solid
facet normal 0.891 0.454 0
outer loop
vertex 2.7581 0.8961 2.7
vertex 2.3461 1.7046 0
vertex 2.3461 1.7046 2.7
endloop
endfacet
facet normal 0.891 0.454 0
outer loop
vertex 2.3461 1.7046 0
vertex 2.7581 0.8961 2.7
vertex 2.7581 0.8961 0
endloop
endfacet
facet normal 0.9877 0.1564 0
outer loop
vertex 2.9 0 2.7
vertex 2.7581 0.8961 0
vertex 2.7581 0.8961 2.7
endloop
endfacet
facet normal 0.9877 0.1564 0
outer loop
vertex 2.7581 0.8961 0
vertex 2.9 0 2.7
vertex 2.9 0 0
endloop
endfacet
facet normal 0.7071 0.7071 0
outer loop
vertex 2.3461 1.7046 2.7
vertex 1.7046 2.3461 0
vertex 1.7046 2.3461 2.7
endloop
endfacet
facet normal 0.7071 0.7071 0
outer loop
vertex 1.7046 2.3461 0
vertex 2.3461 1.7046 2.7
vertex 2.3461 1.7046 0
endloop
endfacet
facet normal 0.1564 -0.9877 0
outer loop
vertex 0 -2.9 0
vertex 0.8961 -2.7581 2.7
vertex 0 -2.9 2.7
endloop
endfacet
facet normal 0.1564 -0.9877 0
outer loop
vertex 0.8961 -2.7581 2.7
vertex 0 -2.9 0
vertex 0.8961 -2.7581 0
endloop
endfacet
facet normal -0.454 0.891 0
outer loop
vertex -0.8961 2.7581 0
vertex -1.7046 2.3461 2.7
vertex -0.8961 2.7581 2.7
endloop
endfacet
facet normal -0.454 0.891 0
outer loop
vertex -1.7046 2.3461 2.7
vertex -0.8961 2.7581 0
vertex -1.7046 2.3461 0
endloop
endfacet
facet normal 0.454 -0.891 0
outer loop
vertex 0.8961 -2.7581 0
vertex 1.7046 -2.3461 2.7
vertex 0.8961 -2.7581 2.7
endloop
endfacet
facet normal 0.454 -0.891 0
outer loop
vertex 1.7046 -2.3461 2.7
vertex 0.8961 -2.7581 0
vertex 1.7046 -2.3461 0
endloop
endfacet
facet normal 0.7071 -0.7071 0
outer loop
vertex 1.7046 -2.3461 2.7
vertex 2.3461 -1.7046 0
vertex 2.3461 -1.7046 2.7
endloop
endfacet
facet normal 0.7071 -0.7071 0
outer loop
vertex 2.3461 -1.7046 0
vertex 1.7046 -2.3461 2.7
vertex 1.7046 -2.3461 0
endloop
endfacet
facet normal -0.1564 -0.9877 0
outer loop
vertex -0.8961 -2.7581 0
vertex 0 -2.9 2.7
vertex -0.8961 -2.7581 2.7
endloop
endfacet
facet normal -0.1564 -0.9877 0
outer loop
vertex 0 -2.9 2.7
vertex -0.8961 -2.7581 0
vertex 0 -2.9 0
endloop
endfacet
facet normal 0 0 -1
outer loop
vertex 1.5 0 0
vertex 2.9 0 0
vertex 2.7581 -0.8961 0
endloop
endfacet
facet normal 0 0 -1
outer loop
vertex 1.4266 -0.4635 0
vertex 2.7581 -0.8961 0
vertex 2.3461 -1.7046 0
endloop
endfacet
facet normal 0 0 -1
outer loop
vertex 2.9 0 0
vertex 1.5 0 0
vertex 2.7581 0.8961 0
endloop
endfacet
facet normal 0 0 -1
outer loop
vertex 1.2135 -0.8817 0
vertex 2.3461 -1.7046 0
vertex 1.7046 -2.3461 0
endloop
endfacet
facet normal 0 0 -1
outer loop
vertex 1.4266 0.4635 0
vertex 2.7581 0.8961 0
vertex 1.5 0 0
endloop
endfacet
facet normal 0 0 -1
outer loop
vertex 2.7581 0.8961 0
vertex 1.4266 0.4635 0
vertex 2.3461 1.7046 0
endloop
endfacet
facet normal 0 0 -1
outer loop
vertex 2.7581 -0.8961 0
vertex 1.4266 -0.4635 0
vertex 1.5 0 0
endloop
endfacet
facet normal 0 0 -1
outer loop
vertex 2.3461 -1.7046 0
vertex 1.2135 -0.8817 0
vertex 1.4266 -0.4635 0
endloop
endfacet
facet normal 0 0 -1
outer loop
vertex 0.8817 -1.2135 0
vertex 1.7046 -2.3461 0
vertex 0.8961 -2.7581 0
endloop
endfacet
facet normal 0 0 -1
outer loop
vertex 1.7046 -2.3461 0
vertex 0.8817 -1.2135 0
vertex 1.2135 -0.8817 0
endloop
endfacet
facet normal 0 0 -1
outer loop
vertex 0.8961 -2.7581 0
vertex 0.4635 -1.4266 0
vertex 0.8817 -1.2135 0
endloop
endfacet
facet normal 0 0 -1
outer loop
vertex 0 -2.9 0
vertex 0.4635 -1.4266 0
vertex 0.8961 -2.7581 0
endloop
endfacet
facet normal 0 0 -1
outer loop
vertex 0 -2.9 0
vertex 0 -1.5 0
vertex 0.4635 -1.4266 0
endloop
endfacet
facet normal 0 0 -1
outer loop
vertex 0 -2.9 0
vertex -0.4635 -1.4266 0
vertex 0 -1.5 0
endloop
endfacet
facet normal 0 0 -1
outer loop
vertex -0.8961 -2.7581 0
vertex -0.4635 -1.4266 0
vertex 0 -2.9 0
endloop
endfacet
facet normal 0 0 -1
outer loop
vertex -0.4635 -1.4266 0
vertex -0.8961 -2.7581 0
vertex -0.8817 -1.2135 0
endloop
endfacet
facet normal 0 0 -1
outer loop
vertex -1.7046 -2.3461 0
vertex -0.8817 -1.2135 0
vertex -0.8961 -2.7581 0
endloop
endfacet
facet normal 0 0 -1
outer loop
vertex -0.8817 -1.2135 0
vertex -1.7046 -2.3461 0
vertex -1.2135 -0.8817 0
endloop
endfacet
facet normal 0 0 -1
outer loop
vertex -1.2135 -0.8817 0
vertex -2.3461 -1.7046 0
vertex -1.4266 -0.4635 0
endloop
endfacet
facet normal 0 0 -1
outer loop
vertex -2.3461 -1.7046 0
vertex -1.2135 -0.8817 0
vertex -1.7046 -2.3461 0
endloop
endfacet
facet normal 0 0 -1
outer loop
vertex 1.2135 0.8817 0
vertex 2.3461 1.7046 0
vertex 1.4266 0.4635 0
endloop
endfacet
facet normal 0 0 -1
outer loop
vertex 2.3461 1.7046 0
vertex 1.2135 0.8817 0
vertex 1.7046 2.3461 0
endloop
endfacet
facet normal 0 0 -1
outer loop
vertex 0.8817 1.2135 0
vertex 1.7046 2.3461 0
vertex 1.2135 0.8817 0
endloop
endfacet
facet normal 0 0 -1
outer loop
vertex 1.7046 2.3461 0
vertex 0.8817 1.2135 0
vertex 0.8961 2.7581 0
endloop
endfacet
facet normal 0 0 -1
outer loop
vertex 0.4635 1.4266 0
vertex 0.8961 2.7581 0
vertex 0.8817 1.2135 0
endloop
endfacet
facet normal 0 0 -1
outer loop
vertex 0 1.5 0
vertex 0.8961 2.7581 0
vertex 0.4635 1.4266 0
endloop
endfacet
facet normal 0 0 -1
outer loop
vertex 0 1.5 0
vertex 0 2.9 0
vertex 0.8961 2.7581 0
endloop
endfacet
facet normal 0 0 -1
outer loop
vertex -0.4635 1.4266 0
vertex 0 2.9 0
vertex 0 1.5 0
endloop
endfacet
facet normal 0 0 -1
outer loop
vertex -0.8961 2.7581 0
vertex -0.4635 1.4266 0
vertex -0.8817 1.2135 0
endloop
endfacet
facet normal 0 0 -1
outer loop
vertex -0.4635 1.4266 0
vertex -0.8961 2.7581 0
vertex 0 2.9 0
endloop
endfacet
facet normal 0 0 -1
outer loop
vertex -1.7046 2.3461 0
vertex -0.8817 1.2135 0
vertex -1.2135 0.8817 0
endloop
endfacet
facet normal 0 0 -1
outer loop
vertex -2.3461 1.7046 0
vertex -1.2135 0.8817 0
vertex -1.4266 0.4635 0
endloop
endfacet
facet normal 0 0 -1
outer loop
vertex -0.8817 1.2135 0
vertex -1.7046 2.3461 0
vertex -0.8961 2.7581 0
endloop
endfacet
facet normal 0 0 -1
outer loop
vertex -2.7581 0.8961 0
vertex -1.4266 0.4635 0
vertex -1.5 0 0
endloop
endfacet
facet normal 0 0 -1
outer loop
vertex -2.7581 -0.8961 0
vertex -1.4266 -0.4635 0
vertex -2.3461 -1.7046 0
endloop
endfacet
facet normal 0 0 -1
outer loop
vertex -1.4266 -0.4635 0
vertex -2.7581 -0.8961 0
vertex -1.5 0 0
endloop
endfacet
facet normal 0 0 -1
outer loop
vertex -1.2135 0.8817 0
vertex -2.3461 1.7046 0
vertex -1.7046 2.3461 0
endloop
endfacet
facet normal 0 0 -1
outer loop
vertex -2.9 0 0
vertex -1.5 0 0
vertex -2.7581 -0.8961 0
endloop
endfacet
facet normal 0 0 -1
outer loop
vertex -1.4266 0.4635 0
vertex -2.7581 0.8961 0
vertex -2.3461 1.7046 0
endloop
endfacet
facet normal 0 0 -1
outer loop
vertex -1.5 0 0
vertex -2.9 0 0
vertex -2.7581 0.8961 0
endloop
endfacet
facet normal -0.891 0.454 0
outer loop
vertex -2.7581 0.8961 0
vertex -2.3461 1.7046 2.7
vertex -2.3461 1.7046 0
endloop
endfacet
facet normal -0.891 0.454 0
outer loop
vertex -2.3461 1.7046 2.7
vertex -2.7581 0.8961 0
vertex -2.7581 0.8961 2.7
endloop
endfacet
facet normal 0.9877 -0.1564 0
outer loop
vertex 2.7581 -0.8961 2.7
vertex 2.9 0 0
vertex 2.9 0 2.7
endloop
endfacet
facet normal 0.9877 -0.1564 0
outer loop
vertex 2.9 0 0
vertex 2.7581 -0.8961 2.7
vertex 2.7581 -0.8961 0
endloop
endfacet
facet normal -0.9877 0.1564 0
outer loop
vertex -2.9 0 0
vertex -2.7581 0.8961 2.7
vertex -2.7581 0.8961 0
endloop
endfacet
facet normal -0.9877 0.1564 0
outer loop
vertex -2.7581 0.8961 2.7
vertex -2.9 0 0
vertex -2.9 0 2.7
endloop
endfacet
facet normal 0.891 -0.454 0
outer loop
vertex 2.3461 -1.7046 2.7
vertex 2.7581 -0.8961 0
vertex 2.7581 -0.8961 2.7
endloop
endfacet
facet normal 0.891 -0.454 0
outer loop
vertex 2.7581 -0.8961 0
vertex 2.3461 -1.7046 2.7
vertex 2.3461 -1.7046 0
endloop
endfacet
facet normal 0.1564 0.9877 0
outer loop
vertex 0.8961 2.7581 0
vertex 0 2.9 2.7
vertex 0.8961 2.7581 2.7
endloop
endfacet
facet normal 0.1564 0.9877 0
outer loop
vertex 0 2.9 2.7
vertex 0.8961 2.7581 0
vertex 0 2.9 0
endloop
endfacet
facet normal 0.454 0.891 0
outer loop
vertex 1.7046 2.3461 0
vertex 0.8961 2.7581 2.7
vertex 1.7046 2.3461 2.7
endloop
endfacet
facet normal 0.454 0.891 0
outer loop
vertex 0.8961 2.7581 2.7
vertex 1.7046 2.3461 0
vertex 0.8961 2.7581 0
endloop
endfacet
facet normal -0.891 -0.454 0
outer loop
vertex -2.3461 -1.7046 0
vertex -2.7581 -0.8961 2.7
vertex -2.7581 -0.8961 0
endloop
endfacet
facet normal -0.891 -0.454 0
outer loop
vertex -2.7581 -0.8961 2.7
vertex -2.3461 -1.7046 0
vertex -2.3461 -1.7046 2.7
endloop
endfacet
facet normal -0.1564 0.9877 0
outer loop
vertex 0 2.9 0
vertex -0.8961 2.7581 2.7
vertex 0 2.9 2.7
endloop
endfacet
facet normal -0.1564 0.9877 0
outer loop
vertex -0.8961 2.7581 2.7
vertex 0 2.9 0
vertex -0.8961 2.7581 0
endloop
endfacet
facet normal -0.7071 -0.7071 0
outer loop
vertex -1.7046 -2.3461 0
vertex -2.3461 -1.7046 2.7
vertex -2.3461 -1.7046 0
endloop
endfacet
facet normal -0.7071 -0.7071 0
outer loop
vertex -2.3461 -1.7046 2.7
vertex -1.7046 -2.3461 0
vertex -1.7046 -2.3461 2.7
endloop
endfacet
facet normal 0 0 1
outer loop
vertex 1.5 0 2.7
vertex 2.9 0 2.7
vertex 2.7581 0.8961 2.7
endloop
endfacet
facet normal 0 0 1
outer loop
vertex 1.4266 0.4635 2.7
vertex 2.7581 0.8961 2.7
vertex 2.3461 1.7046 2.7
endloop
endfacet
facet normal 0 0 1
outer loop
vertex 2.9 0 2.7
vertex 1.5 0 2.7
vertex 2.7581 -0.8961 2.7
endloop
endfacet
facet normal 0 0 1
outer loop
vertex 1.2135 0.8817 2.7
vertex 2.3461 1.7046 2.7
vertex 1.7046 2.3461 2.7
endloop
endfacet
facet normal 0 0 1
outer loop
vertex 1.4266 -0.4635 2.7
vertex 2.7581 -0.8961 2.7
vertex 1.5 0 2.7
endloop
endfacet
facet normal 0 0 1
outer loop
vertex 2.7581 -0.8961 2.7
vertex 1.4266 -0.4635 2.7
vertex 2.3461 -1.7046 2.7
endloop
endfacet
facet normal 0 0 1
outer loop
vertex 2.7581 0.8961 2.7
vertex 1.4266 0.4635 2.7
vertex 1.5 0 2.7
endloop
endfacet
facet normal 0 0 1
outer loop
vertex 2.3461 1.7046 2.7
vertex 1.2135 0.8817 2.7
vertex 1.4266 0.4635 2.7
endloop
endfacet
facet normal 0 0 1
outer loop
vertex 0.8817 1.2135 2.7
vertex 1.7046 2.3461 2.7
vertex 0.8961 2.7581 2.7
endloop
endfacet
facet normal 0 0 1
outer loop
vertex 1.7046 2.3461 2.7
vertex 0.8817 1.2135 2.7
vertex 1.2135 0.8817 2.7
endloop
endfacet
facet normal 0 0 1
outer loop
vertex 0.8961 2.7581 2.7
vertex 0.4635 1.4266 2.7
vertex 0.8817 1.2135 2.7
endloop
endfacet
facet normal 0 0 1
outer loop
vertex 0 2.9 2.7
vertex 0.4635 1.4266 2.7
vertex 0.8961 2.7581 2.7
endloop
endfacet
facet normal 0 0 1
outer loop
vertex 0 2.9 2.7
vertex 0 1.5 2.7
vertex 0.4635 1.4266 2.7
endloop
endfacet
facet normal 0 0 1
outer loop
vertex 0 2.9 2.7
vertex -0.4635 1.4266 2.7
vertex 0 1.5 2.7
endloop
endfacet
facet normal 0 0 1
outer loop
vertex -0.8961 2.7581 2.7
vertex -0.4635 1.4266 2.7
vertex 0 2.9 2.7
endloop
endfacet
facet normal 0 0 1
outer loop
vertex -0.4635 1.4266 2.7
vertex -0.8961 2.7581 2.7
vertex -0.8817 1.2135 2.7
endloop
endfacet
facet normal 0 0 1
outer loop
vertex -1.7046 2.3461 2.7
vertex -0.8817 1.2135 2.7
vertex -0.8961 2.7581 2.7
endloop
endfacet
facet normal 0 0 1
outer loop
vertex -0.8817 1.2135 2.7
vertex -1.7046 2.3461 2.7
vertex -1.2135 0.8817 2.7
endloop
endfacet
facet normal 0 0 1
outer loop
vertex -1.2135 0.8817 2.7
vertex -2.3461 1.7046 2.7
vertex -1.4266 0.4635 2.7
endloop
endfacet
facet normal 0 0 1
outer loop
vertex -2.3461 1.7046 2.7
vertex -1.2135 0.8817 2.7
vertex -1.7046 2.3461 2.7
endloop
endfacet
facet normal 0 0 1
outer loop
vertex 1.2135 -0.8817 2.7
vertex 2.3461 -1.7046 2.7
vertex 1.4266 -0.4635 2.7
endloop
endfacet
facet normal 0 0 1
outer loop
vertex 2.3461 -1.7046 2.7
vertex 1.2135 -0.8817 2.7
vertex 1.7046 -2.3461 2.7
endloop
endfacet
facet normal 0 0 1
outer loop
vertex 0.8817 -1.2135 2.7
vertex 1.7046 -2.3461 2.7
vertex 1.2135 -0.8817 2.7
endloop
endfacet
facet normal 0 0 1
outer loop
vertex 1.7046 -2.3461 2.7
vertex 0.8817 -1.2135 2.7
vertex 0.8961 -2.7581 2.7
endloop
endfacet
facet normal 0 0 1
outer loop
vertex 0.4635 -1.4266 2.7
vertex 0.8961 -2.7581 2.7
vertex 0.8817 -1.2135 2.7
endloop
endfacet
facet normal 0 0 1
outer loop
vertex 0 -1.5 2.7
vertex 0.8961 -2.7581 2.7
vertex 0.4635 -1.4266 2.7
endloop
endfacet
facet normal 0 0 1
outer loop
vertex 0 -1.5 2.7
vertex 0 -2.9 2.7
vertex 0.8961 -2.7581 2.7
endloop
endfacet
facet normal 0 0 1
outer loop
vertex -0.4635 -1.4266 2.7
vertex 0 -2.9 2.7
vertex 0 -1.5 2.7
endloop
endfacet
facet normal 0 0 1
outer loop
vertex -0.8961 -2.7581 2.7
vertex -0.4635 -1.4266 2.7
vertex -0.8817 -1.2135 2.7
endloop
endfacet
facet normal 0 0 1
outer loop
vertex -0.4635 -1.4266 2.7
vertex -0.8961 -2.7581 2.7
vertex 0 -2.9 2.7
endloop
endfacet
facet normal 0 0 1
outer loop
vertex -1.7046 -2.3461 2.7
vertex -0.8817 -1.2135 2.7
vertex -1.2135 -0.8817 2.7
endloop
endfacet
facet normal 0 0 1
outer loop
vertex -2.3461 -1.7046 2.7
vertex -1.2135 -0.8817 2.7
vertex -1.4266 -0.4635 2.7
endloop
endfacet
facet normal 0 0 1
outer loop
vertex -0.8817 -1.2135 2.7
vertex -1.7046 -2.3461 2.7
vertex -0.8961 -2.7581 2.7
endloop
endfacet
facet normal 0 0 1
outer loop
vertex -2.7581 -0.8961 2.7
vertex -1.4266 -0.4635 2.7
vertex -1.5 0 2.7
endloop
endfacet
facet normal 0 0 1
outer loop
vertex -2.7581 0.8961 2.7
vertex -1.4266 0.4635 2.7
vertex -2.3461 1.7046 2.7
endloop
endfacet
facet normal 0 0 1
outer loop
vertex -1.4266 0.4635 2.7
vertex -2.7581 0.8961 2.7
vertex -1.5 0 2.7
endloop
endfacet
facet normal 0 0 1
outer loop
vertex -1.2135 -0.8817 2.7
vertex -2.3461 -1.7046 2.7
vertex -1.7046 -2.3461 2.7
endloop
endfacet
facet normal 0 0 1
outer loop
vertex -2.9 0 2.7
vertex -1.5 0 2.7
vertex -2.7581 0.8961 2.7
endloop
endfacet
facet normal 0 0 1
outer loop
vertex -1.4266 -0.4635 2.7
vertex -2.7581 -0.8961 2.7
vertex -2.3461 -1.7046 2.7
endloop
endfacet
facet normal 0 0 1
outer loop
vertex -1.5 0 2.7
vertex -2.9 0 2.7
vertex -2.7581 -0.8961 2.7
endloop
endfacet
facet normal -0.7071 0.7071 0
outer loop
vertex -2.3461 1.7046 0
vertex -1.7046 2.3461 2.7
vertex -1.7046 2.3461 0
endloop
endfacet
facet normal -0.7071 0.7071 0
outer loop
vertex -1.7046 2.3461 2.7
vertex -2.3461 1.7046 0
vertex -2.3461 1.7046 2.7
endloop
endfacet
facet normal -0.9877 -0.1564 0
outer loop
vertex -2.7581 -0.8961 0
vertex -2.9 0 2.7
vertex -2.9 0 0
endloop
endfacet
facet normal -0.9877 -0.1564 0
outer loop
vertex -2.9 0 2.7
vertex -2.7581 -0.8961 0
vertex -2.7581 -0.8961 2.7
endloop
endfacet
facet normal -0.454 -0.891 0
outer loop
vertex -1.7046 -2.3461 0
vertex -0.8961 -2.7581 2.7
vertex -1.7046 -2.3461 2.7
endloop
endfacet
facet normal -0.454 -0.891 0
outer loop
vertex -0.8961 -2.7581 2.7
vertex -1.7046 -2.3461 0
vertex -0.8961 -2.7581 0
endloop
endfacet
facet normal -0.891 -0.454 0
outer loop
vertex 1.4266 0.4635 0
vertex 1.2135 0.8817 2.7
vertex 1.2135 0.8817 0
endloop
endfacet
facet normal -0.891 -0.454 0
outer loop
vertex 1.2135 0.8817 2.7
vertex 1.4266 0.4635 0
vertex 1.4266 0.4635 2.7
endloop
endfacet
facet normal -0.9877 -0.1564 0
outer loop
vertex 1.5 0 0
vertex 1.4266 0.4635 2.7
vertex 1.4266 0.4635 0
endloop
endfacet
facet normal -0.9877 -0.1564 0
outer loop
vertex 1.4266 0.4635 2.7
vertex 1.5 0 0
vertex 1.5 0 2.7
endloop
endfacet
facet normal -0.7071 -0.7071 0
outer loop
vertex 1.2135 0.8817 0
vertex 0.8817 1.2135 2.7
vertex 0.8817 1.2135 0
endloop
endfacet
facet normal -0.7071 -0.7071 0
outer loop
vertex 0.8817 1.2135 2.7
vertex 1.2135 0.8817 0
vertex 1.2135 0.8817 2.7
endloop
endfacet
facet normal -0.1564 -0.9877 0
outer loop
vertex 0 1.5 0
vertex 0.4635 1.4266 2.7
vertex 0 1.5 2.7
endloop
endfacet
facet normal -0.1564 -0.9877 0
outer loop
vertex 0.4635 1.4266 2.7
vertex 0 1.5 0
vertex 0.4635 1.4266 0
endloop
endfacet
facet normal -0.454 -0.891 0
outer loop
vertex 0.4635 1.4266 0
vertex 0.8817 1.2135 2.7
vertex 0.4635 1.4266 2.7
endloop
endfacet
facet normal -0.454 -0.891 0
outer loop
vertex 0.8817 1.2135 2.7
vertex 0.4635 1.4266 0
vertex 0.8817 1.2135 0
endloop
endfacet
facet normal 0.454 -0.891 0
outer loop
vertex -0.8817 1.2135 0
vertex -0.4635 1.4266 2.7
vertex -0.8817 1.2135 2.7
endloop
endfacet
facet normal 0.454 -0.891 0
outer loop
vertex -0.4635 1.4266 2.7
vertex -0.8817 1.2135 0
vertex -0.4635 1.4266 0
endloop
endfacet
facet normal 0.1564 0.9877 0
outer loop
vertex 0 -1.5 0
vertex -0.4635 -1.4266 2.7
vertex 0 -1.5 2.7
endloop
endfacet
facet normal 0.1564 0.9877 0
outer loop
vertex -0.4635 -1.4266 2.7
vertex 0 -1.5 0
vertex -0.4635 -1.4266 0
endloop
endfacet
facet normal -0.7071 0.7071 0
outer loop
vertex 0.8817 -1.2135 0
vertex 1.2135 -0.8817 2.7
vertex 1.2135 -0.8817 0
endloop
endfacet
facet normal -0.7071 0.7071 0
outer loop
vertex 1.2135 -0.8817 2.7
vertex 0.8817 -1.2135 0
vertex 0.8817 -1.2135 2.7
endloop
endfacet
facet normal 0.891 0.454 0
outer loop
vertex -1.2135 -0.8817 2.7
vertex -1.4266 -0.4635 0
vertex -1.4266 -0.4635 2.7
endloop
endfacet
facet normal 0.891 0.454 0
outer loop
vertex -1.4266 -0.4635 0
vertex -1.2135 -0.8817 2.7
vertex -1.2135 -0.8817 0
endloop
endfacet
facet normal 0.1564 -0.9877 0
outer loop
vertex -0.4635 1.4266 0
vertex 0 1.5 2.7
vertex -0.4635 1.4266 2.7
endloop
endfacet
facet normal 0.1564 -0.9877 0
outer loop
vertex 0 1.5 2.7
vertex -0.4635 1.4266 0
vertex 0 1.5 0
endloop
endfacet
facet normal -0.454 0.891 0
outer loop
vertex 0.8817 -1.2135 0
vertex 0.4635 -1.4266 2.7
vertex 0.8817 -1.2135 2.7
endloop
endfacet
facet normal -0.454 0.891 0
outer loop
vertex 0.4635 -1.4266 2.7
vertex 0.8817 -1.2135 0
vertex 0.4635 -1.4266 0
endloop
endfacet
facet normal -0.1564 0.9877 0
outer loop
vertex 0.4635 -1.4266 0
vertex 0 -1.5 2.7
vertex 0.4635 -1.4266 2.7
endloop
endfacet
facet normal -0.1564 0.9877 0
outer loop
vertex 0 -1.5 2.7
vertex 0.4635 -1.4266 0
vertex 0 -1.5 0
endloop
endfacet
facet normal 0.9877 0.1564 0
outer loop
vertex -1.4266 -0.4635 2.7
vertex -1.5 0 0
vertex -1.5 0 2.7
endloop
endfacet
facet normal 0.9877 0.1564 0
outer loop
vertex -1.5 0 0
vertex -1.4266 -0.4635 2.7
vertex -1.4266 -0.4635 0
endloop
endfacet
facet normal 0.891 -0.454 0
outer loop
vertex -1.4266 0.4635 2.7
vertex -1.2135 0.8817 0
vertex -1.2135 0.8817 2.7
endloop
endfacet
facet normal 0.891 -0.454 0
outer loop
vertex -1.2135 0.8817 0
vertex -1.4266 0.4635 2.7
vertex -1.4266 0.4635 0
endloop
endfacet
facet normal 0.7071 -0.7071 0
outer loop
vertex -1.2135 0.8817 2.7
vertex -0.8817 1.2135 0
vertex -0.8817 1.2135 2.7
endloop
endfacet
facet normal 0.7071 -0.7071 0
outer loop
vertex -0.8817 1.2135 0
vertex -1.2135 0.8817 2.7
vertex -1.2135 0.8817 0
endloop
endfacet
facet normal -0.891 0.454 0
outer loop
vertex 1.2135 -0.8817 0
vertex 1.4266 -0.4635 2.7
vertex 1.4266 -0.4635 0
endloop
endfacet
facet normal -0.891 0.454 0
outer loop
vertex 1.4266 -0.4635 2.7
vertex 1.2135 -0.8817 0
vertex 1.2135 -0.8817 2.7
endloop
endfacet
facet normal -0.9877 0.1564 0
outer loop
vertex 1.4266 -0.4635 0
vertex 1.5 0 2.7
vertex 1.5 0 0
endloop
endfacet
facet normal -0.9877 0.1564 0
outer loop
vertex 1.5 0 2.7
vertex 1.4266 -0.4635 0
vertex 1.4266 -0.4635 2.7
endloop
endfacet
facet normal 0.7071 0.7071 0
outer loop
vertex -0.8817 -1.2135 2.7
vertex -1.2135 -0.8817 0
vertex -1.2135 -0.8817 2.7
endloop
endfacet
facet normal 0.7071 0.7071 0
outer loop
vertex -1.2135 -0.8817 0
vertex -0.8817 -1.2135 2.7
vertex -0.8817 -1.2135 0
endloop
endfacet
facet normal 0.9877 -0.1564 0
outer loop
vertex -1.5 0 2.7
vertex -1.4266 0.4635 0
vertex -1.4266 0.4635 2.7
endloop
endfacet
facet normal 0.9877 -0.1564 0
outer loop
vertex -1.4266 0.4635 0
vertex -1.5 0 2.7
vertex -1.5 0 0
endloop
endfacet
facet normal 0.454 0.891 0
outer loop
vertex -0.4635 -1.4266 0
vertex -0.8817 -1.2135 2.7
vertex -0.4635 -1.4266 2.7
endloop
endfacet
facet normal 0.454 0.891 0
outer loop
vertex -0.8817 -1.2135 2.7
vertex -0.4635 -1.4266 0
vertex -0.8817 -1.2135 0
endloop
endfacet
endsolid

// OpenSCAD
$fn=20;
height = 2.7;
inner_diameter = 3; //M3
outer_diameter = 5.8;   //the diameter of the hole in the key
difference(){
    cylinder(height, d=5.8);
    translate([0,0,-1])cylinder(height+2, d=3);
}
